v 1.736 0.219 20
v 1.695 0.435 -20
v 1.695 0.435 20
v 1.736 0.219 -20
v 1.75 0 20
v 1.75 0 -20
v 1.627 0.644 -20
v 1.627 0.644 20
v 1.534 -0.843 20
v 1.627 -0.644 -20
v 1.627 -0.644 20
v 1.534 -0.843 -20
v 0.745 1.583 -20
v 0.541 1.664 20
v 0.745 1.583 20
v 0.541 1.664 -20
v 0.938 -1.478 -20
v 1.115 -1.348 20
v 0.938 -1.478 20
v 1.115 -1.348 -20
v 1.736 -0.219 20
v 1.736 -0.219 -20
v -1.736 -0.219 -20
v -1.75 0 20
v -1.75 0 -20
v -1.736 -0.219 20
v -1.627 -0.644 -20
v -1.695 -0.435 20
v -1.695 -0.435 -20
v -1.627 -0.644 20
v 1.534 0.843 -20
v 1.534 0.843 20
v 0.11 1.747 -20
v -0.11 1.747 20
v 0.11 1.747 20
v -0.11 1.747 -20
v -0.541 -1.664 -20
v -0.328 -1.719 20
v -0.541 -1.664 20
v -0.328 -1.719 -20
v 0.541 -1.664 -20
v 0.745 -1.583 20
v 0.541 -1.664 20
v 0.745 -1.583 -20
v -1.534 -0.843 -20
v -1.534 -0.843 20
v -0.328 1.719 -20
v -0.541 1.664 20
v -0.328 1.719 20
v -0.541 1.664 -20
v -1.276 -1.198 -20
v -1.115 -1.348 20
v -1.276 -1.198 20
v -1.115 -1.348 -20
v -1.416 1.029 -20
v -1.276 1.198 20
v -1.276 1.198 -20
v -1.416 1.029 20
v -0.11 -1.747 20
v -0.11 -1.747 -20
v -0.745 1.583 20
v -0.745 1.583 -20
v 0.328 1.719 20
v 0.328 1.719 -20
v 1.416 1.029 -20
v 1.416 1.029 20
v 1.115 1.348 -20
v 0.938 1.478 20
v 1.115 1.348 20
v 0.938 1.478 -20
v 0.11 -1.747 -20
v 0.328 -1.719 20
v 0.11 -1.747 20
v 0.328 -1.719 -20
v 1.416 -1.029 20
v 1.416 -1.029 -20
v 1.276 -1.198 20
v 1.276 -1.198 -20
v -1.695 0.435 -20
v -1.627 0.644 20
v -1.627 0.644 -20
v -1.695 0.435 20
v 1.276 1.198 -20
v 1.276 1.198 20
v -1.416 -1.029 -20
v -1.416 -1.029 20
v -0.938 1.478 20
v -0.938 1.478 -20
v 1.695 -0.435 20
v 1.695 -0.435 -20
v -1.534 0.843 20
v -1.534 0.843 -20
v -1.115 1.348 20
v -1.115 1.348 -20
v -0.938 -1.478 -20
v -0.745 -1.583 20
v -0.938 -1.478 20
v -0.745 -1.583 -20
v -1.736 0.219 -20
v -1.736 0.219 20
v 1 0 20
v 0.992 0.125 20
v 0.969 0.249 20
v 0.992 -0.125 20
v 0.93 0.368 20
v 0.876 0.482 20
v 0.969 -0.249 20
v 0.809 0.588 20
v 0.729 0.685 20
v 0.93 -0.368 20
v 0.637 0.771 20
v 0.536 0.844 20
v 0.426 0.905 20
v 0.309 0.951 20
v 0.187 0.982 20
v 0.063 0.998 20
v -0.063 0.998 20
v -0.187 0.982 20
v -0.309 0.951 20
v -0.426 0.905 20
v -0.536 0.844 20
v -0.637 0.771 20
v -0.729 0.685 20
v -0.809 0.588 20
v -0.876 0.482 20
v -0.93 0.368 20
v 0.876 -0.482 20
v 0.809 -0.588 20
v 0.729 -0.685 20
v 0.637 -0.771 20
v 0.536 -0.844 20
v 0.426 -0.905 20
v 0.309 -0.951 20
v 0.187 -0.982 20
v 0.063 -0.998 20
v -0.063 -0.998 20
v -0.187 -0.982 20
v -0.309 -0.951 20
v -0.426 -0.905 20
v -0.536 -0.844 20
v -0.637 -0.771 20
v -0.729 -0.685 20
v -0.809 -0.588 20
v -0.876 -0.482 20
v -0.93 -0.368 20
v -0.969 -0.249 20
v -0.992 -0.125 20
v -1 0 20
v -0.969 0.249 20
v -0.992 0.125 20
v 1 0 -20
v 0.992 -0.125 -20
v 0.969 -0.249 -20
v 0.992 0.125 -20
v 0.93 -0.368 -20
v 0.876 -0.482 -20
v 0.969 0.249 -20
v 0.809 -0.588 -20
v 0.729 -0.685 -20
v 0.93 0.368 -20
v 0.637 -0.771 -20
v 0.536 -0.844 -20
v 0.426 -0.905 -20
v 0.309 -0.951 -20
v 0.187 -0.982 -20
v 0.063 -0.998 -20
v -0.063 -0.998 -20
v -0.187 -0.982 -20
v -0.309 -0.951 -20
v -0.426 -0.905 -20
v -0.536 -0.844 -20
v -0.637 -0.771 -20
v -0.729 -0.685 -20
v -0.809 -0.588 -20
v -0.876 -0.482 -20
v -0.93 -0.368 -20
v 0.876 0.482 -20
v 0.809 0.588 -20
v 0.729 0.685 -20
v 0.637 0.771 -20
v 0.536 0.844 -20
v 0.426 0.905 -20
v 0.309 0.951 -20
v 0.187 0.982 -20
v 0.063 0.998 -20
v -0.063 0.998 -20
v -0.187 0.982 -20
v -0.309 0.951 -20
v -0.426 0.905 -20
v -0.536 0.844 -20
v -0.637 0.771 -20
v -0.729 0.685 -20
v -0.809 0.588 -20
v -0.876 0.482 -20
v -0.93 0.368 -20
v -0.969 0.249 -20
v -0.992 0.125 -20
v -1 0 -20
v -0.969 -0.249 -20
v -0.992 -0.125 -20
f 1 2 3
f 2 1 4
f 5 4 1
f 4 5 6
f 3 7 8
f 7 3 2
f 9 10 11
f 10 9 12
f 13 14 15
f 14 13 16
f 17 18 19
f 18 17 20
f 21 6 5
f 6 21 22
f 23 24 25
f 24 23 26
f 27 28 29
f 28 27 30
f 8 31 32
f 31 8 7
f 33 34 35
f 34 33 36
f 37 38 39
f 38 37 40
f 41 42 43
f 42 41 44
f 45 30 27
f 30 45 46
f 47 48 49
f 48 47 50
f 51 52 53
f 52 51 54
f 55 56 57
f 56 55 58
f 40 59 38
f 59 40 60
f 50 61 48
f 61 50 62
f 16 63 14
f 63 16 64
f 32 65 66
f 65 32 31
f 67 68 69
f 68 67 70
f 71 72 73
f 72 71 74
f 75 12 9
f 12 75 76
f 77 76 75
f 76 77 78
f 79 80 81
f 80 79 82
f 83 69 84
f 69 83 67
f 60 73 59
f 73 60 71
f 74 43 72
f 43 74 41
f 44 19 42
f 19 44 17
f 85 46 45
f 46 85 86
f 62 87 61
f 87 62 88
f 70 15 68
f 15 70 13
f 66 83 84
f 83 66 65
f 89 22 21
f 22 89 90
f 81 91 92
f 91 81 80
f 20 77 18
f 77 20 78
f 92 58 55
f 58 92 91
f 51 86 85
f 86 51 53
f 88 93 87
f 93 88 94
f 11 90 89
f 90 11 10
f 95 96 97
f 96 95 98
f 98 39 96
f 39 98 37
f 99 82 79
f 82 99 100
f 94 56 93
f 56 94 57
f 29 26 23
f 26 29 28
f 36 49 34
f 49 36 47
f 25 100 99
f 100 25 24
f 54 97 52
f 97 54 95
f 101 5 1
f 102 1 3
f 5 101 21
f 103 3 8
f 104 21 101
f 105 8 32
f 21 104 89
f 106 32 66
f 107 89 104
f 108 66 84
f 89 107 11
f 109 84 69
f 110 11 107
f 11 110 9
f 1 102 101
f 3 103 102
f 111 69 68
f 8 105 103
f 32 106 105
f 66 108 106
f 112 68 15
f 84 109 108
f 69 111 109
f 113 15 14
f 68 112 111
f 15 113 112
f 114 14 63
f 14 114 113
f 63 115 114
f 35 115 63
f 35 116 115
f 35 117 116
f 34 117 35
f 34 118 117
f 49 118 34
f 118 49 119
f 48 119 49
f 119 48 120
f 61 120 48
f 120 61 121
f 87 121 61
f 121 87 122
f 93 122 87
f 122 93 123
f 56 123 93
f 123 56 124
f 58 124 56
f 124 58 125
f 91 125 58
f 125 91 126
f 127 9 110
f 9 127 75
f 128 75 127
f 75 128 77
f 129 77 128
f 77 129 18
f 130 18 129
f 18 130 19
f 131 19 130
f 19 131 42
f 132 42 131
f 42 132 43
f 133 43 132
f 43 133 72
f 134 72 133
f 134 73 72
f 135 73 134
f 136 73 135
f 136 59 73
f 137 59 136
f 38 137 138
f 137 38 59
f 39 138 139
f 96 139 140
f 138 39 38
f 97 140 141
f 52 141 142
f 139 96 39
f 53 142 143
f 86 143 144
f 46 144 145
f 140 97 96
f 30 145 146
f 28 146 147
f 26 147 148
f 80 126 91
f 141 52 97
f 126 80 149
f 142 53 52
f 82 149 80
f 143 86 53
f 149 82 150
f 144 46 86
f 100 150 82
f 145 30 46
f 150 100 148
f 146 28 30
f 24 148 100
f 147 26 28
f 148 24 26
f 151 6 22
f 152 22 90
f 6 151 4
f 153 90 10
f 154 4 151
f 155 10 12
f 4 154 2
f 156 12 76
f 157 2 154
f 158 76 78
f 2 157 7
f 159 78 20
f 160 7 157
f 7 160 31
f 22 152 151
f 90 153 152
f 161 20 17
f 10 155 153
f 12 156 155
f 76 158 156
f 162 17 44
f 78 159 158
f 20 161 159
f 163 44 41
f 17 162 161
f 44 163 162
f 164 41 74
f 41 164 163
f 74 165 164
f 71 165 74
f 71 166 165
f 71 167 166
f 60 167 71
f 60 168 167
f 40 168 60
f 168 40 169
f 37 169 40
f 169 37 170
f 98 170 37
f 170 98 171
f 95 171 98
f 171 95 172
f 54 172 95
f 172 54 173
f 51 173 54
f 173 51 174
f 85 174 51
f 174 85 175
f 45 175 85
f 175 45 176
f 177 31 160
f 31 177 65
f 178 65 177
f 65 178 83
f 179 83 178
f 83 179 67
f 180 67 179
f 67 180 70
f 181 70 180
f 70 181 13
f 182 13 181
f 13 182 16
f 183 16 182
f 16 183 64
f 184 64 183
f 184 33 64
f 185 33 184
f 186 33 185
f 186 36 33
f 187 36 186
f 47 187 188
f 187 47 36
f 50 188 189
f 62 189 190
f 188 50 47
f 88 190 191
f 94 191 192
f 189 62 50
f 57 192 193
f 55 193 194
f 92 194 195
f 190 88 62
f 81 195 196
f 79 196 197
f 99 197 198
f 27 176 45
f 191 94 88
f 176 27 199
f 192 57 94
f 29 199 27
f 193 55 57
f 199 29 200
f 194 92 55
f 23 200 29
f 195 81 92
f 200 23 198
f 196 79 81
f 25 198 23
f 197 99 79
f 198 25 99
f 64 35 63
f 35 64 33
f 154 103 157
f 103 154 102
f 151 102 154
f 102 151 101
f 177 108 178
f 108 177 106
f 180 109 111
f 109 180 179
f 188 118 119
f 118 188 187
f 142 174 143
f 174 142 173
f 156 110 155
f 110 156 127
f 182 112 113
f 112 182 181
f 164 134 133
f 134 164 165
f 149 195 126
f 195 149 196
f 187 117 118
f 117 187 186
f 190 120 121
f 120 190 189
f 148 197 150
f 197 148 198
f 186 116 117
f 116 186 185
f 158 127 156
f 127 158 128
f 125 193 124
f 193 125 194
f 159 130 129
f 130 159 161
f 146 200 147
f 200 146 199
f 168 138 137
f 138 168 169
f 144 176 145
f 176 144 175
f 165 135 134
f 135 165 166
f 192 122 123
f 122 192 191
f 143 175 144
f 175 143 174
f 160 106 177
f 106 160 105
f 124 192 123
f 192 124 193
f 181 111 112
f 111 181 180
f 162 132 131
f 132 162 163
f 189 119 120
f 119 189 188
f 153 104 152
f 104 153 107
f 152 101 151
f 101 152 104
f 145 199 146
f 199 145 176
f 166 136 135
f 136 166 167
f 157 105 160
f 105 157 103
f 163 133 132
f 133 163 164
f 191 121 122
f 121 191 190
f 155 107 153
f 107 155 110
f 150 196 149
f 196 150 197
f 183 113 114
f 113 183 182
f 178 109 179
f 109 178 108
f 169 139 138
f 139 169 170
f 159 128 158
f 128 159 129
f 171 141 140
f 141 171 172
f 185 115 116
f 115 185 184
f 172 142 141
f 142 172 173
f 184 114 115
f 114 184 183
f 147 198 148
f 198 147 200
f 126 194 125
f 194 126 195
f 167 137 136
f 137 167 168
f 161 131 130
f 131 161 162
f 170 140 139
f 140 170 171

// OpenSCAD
$fn = 50;


difference() {
	union() {
		translate(v = [0, 0, -20.0000000000]) {
			cylinder(h = 40, r = 1.7500000000);
		}
	}
	union() {
		translate(v = [0, 0, -100.0000000000]) {
			cylinder(h = 200, r = 1.0000000000);
		}
	}
}
